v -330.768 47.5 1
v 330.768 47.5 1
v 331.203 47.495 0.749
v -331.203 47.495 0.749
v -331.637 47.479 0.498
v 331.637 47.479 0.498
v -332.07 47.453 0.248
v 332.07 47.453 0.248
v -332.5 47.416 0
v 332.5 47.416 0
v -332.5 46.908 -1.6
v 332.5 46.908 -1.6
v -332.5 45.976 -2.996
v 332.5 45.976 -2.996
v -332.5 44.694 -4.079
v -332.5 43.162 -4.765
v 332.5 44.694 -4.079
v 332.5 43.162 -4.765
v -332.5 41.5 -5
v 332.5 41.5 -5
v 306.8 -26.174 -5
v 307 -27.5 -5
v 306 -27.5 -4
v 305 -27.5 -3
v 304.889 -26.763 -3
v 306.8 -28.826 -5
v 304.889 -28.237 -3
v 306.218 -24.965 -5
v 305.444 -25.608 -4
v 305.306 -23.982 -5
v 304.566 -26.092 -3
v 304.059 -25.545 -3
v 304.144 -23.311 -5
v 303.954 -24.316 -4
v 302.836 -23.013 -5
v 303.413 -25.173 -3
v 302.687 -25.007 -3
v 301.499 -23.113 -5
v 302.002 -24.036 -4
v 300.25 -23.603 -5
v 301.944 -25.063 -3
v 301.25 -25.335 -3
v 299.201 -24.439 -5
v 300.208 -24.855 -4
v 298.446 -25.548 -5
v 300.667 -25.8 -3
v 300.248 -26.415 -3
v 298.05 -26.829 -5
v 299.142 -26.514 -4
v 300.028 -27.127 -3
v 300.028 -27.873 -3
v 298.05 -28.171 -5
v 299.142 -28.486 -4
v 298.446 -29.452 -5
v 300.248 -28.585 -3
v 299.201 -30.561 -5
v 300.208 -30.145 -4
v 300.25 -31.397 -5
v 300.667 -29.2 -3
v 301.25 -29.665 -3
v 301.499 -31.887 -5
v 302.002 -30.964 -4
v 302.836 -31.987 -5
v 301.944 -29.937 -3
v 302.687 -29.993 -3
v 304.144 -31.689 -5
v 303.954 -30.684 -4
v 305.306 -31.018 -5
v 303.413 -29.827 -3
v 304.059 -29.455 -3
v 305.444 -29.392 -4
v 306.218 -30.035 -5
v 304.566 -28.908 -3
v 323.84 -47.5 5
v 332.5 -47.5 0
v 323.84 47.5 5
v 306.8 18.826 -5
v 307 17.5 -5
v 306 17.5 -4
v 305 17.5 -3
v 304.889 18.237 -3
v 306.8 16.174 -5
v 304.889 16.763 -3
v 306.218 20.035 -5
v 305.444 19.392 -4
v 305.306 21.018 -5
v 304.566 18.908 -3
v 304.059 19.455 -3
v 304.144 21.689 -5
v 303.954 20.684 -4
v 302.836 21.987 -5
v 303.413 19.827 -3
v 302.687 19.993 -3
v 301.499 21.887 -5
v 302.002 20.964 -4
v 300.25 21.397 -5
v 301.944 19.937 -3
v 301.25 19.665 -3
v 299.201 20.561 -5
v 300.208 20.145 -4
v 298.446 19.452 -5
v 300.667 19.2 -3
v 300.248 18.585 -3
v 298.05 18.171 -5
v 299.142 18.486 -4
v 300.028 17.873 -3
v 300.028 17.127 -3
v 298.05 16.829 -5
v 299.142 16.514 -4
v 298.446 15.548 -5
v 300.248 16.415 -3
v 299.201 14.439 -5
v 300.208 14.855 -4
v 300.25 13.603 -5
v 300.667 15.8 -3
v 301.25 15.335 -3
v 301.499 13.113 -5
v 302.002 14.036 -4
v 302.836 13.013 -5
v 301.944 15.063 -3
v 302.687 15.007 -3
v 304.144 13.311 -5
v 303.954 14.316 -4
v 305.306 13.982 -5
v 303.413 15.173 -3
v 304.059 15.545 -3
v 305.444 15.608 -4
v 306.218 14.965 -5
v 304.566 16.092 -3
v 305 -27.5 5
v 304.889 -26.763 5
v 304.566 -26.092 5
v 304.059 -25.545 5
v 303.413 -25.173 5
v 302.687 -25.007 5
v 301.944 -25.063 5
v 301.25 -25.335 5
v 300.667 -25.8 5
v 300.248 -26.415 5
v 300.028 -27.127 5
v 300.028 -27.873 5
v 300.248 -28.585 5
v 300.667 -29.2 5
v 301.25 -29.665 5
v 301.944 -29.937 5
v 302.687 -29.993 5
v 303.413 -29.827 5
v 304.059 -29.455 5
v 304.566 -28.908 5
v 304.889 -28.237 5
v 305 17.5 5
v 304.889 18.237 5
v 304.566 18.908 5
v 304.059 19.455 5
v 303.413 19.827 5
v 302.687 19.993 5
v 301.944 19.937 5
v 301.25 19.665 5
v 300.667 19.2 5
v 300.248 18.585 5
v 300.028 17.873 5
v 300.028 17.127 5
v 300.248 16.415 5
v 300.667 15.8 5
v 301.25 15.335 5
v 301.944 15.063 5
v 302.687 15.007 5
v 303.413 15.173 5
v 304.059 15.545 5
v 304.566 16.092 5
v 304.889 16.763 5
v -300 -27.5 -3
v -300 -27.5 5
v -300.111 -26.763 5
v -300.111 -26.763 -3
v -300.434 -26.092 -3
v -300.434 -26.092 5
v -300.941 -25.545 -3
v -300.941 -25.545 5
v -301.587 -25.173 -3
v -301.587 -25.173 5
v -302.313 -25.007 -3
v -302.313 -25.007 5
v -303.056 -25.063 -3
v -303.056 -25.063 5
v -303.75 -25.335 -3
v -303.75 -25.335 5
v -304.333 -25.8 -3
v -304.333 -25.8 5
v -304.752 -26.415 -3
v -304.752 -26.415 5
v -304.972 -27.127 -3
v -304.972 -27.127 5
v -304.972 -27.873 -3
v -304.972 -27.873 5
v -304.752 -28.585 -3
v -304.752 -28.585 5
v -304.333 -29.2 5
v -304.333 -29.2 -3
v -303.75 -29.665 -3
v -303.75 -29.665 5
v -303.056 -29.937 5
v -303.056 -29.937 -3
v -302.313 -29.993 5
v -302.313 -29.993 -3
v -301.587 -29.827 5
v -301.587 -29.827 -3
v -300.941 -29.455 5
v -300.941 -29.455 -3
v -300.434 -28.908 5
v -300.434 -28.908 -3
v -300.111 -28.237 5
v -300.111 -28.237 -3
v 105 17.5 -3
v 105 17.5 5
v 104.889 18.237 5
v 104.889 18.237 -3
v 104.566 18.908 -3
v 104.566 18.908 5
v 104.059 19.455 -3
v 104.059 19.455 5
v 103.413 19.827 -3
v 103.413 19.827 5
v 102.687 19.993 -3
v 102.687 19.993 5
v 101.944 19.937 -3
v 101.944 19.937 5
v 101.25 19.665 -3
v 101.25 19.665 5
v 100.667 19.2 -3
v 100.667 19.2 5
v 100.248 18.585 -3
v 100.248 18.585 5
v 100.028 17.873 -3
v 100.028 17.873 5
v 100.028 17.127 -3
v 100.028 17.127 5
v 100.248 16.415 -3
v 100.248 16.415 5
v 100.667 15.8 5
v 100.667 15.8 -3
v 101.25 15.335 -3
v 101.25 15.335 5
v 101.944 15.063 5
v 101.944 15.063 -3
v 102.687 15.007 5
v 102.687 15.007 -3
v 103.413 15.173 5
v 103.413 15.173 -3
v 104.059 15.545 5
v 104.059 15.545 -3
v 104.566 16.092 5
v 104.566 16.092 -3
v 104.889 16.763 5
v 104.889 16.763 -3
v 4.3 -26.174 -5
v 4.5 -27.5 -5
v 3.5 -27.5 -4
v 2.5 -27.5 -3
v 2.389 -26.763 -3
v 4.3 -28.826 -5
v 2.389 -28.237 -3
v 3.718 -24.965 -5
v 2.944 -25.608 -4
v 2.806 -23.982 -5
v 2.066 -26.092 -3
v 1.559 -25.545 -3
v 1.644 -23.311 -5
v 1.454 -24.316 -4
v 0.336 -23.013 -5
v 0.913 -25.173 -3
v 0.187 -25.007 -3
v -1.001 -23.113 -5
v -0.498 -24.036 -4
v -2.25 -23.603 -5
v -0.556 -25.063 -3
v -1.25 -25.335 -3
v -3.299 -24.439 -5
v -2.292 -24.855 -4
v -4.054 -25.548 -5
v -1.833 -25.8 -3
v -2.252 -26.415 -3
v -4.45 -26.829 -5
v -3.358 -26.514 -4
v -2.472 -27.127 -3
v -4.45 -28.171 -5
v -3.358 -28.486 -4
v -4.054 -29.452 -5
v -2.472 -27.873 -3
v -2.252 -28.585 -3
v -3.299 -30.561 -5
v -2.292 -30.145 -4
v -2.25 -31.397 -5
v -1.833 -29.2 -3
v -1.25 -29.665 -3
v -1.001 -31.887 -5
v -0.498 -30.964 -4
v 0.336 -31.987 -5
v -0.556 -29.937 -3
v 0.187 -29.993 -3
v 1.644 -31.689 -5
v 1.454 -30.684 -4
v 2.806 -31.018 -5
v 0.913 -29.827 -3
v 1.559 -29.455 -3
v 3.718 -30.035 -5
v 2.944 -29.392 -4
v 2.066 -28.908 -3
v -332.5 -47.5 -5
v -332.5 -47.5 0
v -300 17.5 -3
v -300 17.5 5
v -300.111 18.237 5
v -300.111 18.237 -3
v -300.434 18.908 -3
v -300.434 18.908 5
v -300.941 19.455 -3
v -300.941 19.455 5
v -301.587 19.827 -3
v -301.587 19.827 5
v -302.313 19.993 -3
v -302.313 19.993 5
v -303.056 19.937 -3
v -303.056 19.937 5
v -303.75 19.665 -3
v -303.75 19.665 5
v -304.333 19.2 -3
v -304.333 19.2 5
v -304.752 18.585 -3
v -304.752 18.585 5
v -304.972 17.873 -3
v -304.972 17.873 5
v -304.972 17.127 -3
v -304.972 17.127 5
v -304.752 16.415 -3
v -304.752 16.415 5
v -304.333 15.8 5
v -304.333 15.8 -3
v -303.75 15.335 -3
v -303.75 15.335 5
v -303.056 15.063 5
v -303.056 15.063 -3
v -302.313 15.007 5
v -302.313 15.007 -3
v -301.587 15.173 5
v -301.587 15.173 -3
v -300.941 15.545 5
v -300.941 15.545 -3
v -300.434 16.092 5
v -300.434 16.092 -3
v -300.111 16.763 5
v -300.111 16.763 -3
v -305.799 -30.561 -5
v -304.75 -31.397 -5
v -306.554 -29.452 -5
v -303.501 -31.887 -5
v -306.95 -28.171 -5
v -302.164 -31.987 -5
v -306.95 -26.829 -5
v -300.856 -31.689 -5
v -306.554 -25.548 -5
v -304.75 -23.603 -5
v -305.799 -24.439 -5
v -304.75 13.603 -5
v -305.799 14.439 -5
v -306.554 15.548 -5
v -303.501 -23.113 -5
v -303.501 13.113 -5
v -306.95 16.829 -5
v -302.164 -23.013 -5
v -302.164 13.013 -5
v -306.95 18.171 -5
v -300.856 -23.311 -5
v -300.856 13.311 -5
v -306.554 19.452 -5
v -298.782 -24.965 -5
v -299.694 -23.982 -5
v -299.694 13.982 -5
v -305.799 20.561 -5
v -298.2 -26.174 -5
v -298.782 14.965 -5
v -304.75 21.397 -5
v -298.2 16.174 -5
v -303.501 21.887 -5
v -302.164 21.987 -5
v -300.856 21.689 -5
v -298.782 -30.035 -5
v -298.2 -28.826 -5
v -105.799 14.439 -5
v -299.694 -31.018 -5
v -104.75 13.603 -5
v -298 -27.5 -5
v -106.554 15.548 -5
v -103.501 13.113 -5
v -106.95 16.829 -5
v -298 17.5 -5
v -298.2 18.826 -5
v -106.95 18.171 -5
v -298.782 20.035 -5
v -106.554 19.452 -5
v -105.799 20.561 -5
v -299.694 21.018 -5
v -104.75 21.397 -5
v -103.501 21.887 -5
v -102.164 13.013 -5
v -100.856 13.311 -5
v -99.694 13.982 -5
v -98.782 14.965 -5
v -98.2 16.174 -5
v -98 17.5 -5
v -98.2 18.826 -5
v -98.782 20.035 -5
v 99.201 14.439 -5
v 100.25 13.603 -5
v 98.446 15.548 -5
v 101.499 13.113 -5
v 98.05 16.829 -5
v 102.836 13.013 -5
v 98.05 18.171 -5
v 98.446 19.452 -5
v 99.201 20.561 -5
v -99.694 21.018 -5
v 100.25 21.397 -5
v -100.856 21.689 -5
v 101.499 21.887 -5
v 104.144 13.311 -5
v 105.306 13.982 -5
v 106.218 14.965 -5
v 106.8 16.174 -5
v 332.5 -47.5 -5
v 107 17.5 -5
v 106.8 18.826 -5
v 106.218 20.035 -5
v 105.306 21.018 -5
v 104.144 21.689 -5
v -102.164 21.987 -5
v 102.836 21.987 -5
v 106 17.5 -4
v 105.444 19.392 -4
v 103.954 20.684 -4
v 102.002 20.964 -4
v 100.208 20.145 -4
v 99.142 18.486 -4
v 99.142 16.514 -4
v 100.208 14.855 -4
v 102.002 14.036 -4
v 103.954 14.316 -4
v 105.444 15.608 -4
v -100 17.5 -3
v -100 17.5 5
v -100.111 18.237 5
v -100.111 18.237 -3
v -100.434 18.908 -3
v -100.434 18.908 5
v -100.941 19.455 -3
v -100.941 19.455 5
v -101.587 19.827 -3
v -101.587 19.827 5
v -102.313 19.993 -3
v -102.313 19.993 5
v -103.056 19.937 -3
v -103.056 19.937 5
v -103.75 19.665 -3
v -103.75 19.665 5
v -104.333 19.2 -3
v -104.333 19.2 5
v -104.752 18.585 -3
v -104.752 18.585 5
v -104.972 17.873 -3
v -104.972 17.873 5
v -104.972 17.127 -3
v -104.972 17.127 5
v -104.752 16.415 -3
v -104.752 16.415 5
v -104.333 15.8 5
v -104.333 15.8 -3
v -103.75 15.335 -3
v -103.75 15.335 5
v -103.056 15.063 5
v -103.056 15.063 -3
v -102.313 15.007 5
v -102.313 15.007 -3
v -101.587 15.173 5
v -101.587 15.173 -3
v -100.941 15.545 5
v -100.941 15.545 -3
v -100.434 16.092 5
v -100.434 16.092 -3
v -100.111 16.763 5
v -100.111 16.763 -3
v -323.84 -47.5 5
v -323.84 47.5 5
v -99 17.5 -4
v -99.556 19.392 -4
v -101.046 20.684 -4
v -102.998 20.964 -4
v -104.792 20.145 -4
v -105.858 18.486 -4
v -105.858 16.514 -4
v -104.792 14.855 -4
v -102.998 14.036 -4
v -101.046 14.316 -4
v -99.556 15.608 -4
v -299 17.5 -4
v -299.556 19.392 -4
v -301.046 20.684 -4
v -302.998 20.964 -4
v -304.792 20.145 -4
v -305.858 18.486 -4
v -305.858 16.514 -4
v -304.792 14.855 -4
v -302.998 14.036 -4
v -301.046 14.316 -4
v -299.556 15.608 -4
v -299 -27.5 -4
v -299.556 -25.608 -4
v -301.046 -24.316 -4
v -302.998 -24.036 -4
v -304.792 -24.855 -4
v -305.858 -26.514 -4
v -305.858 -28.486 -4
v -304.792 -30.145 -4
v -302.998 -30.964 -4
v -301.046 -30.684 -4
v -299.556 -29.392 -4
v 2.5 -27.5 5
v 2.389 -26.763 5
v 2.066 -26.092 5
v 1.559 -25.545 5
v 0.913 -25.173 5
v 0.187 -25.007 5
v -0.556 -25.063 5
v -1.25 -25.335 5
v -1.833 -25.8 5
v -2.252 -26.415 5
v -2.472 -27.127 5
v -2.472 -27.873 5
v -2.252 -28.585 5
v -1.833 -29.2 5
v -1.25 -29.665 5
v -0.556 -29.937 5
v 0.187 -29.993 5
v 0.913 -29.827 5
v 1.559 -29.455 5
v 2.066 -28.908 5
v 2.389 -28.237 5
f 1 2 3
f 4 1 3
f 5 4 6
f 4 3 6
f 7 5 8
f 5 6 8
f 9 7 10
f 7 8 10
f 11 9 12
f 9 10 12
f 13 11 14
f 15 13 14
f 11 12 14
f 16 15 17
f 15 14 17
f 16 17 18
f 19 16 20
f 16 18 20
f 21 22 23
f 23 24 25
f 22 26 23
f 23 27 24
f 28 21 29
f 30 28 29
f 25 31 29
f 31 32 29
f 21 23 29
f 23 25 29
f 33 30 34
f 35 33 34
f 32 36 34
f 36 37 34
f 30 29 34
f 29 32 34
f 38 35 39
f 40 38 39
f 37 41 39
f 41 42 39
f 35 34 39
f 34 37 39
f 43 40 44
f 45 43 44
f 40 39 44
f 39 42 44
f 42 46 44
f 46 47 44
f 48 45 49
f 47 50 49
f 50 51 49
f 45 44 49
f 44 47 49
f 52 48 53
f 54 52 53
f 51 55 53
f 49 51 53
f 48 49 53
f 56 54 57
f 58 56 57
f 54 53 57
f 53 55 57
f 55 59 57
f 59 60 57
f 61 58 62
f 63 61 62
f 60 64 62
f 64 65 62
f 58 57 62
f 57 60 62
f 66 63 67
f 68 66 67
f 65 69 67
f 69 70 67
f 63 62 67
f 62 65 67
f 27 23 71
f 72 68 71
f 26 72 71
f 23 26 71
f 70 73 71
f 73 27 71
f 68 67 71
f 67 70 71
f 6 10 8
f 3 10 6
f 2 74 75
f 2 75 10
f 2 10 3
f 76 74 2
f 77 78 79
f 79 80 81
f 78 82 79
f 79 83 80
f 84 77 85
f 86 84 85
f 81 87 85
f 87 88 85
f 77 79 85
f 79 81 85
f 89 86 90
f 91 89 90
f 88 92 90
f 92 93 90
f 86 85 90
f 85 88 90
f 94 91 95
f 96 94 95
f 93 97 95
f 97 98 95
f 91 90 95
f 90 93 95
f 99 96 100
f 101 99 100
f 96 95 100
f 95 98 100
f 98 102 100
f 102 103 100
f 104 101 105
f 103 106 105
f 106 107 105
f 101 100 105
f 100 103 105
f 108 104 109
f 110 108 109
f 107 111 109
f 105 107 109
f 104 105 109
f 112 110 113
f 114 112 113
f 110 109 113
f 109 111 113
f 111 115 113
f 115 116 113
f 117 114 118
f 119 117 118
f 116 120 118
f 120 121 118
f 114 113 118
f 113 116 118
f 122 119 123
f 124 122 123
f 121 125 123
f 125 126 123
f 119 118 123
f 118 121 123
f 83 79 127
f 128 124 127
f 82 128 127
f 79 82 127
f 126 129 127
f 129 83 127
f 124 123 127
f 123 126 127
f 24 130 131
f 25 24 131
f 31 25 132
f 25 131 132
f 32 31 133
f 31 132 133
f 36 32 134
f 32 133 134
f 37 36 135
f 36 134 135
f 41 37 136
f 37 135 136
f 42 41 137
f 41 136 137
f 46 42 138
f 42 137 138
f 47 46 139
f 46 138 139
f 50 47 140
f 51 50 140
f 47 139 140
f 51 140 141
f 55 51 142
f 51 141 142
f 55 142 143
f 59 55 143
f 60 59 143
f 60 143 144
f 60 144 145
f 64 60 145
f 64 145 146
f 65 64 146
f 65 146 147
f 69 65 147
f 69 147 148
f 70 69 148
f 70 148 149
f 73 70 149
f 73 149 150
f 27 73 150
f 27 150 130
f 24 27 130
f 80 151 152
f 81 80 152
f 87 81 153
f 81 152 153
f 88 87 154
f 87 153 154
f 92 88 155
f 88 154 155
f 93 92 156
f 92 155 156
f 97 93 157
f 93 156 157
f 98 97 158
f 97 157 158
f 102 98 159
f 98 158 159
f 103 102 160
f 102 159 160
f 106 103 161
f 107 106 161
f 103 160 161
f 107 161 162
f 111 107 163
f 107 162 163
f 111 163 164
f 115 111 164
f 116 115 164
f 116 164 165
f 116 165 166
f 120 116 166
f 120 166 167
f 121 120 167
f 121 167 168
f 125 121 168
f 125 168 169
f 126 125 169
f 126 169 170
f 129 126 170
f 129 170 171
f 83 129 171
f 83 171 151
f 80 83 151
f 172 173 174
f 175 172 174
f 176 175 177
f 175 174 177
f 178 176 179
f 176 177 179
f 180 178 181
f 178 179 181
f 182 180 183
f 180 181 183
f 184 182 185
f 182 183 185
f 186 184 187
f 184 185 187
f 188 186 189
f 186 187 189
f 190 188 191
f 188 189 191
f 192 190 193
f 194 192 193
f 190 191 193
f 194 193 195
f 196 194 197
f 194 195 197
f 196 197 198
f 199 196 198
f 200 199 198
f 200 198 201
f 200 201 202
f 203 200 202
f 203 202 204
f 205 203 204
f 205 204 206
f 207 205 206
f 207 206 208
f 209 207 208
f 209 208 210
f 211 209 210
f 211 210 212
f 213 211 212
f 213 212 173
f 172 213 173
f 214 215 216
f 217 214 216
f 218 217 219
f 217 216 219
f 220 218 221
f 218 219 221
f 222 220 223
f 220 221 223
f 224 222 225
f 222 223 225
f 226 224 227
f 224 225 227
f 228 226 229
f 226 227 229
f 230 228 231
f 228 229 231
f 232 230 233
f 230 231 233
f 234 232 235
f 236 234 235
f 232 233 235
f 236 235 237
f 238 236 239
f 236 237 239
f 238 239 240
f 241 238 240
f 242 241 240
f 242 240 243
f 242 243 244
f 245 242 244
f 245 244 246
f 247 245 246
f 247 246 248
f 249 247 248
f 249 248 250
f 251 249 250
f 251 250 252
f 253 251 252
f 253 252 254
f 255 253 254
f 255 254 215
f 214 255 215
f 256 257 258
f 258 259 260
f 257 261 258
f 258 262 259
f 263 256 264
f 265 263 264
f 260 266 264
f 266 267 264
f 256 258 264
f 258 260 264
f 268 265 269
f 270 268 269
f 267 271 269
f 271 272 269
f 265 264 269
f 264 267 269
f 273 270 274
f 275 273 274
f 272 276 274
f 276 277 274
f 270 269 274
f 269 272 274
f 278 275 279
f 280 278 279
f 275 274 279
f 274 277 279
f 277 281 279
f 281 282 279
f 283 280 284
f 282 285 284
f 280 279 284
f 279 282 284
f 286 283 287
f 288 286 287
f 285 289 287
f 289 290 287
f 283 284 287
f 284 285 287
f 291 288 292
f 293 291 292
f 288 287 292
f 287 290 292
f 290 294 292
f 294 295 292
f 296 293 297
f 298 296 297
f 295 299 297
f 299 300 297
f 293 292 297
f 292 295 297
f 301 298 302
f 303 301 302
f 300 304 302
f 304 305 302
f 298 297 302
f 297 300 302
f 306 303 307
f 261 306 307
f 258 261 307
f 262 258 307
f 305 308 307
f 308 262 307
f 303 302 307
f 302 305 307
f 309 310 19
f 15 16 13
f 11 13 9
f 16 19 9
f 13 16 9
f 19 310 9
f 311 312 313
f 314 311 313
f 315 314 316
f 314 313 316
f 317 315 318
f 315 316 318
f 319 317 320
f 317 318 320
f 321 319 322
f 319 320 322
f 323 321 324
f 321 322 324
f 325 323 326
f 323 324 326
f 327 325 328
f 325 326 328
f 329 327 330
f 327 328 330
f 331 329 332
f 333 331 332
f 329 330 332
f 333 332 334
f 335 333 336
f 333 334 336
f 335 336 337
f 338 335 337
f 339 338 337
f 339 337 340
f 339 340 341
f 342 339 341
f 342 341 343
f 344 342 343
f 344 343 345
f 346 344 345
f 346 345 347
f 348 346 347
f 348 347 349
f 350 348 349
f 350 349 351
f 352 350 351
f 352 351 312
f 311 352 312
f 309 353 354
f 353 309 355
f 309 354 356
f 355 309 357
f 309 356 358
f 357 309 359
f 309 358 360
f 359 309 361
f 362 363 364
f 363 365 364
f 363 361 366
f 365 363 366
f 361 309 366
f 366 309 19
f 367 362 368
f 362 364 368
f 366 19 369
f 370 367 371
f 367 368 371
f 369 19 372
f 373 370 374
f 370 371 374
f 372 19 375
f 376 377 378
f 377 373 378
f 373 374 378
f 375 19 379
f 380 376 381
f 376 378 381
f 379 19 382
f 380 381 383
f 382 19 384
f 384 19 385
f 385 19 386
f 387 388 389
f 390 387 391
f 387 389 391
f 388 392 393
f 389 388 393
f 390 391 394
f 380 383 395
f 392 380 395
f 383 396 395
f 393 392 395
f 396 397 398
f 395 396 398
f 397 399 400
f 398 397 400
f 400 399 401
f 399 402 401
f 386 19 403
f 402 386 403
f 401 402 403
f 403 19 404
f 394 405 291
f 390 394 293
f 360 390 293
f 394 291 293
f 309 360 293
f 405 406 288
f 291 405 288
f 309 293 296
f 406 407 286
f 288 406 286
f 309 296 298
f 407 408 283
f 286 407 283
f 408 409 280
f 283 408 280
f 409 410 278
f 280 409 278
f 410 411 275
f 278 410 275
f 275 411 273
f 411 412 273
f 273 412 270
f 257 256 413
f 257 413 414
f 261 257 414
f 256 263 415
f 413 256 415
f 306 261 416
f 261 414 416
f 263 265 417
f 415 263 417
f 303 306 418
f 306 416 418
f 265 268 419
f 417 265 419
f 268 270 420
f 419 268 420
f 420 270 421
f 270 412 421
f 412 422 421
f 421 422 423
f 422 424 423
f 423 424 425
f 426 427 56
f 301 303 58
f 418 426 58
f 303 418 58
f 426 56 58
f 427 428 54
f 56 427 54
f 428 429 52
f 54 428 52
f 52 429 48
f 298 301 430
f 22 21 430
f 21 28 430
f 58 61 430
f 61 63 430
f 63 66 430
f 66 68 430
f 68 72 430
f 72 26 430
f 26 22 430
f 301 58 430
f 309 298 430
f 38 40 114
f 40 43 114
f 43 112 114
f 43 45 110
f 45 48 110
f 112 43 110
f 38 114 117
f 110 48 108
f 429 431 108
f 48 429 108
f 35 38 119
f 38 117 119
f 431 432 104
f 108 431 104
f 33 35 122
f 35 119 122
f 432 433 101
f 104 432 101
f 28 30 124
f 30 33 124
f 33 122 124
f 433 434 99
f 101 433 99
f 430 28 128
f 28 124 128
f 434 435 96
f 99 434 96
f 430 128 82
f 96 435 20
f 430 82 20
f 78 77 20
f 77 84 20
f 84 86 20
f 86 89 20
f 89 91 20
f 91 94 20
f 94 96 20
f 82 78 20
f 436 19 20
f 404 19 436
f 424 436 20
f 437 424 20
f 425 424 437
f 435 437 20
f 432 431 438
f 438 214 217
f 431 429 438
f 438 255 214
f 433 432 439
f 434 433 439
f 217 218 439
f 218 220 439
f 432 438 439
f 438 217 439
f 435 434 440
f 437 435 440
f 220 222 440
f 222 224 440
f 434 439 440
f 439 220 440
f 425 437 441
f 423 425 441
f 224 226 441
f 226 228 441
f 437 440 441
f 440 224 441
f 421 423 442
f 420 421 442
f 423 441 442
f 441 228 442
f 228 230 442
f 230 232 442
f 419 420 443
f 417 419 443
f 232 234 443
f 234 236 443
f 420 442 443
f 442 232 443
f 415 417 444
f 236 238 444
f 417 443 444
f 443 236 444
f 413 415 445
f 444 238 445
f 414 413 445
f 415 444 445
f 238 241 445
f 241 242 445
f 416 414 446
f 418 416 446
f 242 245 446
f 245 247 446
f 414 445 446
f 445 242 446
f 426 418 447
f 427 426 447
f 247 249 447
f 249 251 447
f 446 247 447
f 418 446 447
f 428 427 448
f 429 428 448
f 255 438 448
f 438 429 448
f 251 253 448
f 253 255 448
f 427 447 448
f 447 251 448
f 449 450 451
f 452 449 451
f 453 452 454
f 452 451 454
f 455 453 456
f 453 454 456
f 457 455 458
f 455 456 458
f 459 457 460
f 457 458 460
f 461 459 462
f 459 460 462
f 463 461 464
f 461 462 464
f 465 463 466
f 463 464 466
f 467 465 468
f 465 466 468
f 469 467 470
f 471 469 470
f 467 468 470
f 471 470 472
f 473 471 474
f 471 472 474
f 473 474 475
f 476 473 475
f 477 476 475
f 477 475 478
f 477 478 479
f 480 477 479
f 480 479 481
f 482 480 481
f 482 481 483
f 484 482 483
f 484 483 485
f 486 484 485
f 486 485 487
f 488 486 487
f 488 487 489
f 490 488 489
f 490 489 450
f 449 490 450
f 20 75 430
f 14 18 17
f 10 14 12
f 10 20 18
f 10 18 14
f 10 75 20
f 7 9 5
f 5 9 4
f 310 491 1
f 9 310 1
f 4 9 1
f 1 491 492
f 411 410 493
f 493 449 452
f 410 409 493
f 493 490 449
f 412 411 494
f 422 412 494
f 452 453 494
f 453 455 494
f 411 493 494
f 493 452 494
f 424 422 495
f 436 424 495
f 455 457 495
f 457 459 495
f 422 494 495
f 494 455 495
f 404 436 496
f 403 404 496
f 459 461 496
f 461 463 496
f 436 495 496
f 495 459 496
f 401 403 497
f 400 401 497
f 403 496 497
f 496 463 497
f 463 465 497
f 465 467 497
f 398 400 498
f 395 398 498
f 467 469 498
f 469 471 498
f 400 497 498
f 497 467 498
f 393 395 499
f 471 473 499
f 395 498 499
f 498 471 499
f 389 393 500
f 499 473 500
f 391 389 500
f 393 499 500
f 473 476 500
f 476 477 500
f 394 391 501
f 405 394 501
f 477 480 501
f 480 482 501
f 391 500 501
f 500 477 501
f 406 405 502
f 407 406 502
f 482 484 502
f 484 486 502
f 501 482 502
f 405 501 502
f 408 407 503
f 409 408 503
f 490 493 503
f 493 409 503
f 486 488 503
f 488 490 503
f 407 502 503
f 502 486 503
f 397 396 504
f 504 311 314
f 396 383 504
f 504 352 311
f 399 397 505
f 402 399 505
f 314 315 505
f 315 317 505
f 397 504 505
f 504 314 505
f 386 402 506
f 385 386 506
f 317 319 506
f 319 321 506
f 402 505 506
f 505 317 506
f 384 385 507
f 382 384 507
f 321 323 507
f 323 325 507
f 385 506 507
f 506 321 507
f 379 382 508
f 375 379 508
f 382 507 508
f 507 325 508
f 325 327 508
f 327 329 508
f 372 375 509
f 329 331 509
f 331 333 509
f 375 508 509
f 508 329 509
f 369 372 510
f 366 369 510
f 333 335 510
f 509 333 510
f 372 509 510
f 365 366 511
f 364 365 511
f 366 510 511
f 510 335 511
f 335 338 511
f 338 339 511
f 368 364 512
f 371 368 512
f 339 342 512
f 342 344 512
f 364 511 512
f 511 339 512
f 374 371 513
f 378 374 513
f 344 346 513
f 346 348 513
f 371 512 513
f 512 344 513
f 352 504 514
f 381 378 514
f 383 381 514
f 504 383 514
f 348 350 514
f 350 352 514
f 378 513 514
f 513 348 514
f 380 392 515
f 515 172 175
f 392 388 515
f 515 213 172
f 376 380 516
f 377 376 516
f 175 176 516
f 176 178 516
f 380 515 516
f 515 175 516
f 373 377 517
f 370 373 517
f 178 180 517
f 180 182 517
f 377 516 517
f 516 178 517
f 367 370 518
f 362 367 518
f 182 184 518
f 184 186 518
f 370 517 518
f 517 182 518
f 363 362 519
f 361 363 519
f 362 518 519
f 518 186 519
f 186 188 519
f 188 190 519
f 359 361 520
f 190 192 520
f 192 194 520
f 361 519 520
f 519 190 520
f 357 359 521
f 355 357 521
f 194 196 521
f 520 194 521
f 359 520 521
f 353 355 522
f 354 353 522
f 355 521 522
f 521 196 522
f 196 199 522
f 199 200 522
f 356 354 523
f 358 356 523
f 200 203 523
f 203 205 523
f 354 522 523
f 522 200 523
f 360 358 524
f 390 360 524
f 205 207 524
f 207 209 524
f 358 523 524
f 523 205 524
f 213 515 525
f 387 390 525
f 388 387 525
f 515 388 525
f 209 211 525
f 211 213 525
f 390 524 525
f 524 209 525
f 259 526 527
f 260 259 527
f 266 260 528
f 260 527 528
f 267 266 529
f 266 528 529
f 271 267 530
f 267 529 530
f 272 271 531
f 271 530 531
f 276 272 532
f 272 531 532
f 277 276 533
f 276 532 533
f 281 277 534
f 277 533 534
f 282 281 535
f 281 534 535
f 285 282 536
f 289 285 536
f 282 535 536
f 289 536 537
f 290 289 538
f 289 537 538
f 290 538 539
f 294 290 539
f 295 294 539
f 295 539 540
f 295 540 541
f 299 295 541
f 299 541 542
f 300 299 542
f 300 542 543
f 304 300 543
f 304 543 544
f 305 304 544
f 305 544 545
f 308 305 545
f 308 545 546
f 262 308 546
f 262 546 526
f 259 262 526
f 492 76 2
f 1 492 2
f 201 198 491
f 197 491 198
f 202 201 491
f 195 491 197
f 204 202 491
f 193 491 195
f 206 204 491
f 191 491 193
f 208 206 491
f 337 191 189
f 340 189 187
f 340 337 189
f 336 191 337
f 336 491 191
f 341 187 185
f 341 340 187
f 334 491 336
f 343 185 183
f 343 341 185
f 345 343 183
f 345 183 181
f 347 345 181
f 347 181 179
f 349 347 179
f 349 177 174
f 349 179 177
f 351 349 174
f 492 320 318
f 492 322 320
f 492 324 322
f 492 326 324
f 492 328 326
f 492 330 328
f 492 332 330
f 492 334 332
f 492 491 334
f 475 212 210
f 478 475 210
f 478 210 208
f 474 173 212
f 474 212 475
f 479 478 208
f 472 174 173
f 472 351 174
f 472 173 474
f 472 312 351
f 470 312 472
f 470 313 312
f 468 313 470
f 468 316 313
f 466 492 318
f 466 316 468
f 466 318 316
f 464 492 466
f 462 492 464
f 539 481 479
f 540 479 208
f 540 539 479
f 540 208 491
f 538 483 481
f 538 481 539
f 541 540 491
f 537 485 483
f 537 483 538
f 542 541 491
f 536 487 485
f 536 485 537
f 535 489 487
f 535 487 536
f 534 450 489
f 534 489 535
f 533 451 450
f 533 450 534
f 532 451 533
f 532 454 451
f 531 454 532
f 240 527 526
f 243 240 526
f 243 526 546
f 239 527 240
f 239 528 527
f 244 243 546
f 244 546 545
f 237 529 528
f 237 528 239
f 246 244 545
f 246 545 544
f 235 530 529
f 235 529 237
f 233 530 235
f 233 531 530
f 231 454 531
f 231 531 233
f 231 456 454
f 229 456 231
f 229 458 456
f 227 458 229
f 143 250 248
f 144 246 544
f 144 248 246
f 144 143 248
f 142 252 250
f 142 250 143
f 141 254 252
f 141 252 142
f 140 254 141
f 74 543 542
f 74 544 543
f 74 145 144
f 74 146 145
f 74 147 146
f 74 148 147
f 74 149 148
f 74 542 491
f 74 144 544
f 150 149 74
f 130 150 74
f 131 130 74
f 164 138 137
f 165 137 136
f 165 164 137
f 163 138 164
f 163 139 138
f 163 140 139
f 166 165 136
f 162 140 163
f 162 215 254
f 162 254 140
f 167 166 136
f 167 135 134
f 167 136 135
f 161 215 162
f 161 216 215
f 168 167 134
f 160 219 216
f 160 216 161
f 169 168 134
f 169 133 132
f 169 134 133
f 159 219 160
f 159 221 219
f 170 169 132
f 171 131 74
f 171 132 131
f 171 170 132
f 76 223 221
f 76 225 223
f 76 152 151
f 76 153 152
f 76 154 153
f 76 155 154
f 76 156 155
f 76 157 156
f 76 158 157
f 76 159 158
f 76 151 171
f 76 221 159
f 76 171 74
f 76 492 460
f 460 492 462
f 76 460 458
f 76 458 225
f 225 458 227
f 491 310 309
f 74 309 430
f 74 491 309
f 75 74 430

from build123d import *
from OCP.BRepFilletAPI import BRepFilletAPI_MakeChamfer

# Parameters (mm, degrees)
SKETCH_1_W          = 665
SKETCH_1_H          = 95
EXTRUDE_1_DEPTH     = 5
FILLET_1_R          = 6
CHAMFER_1_SIZE      = 5
CHAMFER_1_SIZE2     = 8.660254038
SKETCH_3_R          = 2.5
CUT_EXTRUDE_1_DEPTH = 337.024552674
CHAMFER_2_SIZE      = 2


with BuildPart() as part:
    # Эскиз1 → Бобышка-Вытянуть1 (new, symmetric)
    with BuildSketch(Plane.XY):
        Rectangle(SKETCH_1_W, SKETCH_1_H)
    extrude(amount=EXTRUDE_1_DEPTH, both=True)

    # Скругление1
    fillet_1_edges = [part.edges().sort_by_distance(p)[0] for p in [
        (0, 47.5, -5),
    ]]
    fillet(fillet_1_edges, radius=FILLET_1_R)

    # Фаска1: one chamfer whose edges measure the first distance from different faces: ONE call of the kernel's chamfer builder (chamfer() names one face for all edges)
    chamfer_1_edges_1 = [part.edges().sort_by_distance(p)[0] for p in [
        (332.5, 0, 5),
    ]]
    chamfer_1_side_1 = [part.faces().sort_by_distance(p)[0] for p in [
        (332.5, -0.378462122, 0.030006478),
    ]]
    chamfer_1_edges_2 = [part.edges().sort_by_distance(p)[0] for p in [
        (-332.5, 0, 5),
    ]]
    chamfer_1_side_2 = [part.faces().sort_by_distance(p)[0] for p in [
        (-332.5, -0.378462122, 0.030006478),
    ]]
    chamfer_1 = BRepFilletAPI_MakeChamfer(part.part.solid().wrapped)
    for e in chamfer_1_edges_1:
        chamfer_1.Add(CHAMFER_1_SIZE, CHAMFER_1_SIZE2, e.wrapped, chamfer_1_side_1[0].wrapped)  # the first distance lies on this face
    for e in chamfer_1_edges_2:
        chamfer_1.Add(CHAMFER_1_SIZE, CHAMFER_1_SIZE2, e.wrapped, chamfer_1_side_2[0].wrapped)  # the first distance lies on this face
    add(Compound.cast(chamfer_1.Shape()), mode=Mode.REPLACE)

    # Эскиз3 → Вырез-Вытянуть1 (cut, through all)
    with BuildSketch(Plane.XY.offset(5)):
        with Locations((-302.5, -27.5)):
            Circle(SKETCH_3_R)
        with Locations((0, -27.5)):
            Circle(SKETCH_3_R)
        with Locations((302.5, -27.5)):
            Circle(SKETCH_3_R)
        with Locations((-302.5, 17.5)):
            Circle(SKETCH_3_R)
        with Locations((302.5, 17.5)):
            Circle(SKETCH_3_R)
        with Locations((-102.5, 17.5)):
            Circle(SKETCH_3_R)
        with Locations((102.5, 17.5)):
            Circle(SKETCH_3_R)
    extrude(amount=-CUT_EXTRUDE_1_DEPTH, mode=Mode.SUBTRACT)

    # Фаска2
    chamfer_2_edges = [part.edges().sort_by_distance(p)[0] for p in [
        (-2.5, -27.5, -5),
        (300, -27.5, -5),
        (-305, 17.5, -5),
        (300, 17.5, -5),
        (-105, 17.5, -5),
        (100, 17.5, -5),
        (-305, -27.5, -5),
    ]]
    chamfer(chamfer_2_edges, length=CHAMFER_2_SIZE)


solid = part.part
